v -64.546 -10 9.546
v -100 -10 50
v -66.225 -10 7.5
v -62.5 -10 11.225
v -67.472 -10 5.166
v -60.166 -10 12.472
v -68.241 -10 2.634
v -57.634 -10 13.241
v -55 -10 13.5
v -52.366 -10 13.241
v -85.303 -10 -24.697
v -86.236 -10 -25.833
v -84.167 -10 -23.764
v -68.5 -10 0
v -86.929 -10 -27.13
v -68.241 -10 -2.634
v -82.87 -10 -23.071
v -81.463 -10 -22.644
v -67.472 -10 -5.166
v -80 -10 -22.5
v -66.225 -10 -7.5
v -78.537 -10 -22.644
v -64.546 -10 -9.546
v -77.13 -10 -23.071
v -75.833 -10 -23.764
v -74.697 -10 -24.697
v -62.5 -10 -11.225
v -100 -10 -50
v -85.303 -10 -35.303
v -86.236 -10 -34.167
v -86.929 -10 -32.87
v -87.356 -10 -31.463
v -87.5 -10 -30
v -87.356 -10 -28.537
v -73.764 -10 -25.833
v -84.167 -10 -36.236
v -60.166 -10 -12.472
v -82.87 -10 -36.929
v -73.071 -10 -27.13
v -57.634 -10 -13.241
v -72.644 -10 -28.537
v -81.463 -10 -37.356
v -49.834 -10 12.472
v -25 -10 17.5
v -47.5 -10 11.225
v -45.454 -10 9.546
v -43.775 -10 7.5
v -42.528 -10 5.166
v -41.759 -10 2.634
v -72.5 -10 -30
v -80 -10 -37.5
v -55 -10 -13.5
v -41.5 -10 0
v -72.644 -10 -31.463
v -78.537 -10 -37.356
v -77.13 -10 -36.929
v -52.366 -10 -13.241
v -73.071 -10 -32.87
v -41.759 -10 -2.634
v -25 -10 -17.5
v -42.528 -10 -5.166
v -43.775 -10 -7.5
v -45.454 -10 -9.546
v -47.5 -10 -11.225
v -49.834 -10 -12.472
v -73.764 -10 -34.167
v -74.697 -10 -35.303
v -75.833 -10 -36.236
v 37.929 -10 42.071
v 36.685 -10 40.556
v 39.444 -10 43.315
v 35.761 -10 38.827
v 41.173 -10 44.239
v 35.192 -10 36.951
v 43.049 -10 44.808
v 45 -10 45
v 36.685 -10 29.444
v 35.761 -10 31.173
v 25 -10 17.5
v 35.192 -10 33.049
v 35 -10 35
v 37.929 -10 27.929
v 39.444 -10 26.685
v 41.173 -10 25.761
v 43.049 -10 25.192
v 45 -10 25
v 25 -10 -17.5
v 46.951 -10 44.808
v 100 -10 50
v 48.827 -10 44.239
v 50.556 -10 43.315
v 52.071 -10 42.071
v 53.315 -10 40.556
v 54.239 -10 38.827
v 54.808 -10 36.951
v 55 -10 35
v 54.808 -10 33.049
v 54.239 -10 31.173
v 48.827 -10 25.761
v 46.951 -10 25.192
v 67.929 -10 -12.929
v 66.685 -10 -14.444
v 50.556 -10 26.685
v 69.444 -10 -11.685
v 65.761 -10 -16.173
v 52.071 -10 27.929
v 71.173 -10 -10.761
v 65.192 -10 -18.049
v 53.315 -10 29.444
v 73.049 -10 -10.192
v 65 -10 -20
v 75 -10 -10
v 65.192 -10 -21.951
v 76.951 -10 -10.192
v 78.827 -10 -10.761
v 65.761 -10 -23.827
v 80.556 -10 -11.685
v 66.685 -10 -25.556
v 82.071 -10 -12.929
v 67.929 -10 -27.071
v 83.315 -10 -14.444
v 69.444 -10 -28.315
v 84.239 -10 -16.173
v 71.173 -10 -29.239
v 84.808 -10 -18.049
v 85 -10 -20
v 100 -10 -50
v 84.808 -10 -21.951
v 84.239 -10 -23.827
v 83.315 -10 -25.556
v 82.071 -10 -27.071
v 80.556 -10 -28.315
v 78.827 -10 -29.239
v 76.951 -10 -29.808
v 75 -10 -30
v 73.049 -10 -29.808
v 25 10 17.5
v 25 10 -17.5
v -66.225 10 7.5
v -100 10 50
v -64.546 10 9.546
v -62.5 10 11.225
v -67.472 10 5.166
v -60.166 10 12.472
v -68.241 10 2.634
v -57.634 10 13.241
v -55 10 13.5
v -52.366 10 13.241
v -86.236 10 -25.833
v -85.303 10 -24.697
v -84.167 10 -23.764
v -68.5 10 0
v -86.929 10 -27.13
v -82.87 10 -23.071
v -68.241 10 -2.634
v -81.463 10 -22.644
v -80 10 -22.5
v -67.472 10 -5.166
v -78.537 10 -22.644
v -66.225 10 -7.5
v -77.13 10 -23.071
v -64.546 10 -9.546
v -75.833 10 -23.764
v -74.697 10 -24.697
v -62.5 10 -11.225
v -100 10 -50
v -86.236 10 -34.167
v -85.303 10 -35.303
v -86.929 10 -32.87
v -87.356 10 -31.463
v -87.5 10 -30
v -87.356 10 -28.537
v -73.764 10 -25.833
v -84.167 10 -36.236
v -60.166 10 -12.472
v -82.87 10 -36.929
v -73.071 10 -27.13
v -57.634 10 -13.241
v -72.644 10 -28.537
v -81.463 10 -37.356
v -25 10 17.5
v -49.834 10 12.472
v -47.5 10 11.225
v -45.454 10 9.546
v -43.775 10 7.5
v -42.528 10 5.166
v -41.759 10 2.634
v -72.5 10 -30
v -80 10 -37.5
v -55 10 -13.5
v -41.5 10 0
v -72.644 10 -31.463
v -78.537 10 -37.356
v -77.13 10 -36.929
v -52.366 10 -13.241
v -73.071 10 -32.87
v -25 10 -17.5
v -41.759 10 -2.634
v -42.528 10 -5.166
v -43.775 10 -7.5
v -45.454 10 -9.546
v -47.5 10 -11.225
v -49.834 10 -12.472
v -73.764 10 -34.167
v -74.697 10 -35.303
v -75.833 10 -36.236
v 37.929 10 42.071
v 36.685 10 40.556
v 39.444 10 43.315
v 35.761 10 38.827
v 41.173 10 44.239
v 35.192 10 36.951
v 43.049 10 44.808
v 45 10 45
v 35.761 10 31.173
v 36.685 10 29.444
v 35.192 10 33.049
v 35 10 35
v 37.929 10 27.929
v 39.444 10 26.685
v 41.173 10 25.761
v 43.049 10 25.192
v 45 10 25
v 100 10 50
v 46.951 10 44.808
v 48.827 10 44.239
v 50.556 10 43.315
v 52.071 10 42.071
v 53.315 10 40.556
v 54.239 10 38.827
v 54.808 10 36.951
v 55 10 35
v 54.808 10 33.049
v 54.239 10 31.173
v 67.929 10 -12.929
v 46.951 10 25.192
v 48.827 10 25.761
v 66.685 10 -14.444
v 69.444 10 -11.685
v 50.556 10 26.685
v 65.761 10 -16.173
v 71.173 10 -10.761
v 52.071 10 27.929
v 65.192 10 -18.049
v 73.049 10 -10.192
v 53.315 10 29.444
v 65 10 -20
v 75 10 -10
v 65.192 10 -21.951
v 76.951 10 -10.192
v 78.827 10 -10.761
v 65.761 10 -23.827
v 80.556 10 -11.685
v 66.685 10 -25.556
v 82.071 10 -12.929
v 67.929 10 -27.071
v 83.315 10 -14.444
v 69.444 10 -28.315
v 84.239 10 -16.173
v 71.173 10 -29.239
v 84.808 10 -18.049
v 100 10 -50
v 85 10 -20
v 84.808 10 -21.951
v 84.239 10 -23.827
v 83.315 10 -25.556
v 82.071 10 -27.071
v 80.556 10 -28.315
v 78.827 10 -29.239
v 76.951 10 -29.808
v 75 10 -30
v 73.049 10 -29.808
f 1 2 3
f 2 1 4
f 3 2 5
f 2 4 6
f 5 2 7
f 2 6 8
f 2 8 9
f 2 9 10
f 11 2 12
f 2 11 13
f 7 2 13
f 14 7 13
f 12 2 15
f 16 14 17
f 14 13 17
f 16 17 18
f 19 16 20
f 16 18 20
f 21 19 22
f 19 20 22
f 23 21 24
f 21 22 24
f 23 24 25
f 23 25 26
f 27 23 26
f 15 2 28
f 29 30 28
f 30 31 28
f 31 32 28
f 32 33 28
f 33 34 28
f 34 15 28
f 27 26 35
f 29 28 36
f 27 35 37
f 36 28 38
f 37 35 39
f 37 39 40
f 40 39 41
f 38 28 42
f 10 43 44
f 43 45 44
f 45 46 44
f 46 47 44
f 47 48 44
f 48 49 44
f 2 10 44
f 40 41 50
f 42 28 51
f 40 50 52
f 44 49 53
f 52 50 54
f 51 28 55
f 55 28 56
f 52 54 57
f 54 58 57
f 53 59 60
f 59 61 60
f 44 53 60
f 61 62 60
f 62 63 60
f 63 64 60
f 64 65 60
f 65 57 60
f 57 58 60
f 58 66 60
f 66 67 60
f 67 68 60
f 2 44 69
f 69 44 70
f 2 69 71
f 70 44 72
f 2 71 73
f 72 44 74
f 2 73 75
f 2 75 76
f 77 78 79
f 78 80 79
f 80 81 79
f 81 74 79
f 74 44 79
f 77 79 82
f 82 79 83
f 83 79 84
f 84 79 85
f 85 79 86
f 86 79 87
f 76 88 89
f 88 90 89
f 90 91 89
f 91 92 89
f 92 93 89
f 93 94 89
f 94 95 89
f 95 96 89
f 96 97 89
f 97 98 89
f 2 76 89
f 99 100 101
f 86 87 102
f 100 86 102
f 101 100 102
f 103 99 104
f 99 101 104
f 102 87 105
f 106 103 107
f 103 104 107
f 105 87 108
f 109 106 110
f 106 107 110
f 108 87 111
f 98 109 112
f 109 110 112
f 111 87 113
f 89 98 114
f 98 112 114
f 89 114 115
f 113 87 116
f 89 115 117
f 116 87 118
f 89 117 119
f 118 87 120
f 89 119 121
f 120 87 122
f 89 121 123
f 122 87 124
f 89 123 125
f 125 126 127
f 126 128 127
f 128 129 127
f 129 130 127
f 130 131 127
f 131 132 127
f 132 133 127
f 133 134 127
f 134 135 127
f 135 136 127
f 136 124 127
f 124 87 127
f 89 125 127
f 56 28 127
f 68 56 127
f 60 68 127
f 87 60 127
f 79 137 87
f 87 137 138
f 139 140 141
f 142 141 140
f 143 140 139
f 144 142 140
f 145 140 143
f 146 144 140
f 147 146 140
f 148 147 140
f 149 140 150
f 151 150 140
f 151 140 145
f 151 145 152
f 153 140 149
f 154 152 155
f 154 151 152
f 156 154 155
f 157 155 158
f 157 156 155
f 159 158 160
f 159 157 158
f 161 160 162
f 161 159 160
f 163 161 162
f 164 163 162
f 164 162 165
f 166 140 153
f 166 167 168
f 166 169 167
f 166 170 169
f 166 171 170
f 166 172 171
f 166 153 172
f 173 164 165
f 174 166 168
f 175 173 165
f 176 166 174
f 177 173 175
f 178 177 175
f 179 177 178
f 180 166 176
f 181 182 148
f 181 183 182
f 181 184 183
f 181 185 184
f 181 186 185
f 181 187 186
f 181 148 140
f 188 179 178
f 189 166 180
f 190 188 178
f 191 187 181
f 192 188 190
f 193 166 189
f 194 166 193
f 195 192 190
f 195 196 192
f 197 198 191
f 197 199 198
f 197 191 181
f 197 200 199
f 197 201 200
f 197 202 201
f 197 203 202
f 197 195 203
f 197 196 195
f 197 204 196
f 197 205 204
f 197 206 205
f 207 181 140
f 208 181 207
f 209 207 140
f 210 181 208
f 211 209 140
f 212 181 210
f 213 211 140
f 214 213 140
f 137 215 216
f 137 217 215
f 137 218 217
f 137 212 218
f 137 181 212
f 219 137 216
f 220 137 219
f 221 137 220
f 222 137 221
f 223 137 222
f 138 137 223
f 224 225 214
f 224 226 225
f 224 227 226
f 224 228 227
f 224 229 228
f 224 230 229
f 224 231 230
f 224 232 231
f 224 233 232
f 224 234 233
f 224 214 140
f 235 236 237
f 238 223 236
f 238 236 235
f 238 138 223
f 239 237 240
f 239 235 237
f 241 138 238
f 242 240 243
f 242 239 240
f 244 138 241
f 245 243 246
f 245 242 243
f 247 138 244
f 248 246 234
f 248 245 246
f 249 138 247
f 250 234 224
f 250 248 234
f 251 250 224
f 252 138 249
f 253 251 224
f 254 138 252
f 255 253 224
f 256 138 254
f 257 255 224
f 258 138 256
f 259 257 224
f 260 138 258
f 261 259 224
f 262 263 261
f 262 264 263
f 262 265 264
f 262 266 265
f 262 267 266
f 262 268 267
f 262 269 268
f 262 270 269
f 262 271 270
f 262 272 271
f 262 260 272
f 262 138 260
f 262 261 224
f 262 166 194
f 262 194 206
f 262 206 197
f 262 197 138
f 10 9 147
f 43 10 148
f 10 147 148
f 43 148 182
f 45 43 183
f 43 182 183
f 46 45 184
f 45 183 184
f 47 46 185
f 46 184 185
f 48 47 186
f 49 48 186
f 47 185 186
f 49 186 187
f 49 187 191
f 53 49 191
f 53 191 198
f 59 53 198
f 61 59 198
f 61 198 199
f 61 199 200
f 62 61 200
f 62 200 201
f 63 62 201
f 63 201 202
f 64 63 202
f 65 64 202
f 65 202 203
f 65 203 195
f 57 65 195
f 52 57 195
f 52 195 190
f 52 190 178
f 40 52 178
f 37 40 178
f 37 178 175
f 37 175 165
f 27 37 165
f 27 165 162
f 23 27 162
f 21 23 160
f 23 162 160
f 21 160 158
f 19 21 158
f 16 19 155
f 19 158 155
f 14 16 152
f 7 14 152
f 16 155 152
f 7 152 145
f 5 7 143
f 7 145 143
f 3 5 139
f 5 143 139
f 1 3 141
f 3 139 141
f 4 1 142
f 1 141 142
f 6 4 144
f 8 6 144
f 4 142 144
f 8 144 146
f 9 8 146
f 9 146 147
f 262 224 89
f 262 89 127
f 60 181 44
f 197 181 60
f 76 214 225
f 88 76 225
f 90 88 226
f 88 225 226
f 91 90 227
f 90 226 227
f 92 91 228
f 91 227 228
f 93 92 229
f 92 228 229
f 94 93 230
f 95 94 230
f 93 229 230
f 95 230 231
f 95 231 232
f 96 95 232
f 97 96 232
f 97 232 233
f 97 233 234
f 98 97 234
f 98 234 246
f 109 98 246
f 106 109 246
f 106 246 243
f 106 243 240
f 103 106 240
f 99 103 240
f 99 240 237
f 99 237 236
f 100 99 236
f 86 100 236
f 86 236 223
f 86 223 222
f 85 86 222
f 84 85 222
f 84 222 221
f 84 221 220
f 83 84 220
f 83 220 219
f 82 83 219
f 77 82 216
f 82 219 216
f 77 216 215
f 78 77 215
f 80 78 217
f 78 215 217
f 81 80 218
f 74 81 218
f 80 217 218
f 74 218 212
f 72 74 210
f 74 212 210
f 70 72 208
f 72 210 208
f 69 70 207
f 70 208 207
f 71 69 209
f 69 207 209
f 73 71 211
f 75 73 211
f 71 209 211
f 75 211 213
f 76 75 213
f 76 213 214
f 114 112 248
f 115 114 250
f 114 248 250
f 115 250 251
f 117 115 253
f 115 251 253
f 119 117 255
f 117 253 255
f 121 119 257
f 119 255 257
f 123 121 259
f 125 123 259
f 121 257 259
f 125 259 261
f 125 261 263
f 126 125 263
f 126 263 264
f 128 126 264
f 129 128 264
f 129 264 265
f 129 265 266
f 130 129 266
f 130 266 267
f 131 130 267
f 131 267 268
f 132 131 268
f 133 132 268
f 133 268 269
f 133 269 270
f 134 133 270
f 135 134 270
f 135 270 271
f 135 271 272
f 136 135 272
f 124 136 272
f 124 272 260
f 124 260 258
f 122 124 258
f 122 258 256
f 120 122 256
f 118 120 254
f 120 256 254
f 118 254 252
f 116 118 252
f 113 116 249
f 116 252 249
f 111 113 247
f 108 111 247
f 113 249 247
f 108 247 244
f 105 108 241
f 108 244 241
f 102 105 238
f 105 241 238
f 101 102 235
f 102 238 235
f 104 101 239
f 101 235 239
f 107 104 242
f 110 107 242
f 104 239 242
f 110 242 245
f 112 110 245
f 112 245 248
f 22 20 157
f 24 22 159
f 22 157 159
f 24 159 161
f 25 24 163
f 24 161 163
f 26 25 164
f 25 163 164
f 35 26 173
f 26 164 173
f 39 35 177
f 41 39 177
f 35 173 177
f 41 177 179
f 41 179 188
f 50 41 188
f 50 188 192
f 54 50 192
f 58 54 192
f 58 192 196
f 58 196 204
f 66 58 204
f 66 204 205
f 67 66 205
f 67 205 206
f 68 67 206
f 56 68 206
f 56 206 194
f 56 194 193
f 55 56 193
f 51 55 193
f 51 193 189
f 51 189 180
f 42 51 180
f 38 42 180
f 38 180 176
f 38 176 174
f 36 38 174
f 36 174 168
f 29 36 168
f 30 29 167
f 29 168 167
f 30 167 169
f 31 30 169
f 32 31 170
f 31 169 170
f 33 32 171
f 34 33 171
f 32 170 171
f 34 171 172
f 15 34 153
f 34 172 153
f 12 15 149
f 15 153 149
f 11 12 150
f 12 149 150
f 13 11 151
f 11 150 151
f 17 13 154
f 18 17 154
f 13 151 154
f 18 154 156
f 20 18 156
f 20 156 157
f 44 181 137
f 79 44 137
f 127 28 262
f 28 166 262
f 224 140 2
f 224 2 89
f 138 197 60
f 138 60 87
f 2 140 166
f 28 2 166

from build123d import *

# Parameters (mm, degrees)
SKETCH1_W           = 200
SKETCH1_H           = 100
BOSS_EXTRUDE1_DEPTH = 10
SKETCH2_R           = 7.5
SKETCH2_R_2         = 13.5
SKETCH2_R_3         = 10
SKETCH2_W           = 50
SKETCH2_H           = 35
CUT_EXTRUDE1_DEPTH  = 114.578166916


with BuildPart() as part:
    # Sketch1 → Boss-Extrude1 (new, symmetric)
    with BuildSketch(Plane(origin=(0, 0, 0), x_dir=(1, 0, 0), z_dir=(0, 1, 0))):
        Rectangle(SKETCH1_W, SKETCH1_H)
    extrude(amount=BOSS_EXTRUDE1_DEPTH, both=True)

    # Sketch2 → Cut-Extrude1 (cut, through all)
    with BuildSketch(Plane(origin=(0, 10, 0), x_dir=(1, 0, 0), z_dir=(0, 1, 0))):
        with Locations(Location((-80, 30, 0), (0, 0, 270))):
            Circle(SKETCH2_R)
        with Locations(Location((-55, 0, 0), (0, 0, 270))):
            Circle(SKETCH2_R_2)
        with Locations(Location((75, 20, 0), (0, 0, 270))):
            Circle(SKETCH2_R_3)
        with Locations(Location((45, -35, 0), (0, 0, 270))):
            Circle(SKETCH2_R_3)
        Rectangle(SKETCH2_W, SKETCH2_H)
    extrude(amount=-CUT_EXTRUDE1_DEPTH, mode=Mode.SUBTRACT)


solid = part.part
